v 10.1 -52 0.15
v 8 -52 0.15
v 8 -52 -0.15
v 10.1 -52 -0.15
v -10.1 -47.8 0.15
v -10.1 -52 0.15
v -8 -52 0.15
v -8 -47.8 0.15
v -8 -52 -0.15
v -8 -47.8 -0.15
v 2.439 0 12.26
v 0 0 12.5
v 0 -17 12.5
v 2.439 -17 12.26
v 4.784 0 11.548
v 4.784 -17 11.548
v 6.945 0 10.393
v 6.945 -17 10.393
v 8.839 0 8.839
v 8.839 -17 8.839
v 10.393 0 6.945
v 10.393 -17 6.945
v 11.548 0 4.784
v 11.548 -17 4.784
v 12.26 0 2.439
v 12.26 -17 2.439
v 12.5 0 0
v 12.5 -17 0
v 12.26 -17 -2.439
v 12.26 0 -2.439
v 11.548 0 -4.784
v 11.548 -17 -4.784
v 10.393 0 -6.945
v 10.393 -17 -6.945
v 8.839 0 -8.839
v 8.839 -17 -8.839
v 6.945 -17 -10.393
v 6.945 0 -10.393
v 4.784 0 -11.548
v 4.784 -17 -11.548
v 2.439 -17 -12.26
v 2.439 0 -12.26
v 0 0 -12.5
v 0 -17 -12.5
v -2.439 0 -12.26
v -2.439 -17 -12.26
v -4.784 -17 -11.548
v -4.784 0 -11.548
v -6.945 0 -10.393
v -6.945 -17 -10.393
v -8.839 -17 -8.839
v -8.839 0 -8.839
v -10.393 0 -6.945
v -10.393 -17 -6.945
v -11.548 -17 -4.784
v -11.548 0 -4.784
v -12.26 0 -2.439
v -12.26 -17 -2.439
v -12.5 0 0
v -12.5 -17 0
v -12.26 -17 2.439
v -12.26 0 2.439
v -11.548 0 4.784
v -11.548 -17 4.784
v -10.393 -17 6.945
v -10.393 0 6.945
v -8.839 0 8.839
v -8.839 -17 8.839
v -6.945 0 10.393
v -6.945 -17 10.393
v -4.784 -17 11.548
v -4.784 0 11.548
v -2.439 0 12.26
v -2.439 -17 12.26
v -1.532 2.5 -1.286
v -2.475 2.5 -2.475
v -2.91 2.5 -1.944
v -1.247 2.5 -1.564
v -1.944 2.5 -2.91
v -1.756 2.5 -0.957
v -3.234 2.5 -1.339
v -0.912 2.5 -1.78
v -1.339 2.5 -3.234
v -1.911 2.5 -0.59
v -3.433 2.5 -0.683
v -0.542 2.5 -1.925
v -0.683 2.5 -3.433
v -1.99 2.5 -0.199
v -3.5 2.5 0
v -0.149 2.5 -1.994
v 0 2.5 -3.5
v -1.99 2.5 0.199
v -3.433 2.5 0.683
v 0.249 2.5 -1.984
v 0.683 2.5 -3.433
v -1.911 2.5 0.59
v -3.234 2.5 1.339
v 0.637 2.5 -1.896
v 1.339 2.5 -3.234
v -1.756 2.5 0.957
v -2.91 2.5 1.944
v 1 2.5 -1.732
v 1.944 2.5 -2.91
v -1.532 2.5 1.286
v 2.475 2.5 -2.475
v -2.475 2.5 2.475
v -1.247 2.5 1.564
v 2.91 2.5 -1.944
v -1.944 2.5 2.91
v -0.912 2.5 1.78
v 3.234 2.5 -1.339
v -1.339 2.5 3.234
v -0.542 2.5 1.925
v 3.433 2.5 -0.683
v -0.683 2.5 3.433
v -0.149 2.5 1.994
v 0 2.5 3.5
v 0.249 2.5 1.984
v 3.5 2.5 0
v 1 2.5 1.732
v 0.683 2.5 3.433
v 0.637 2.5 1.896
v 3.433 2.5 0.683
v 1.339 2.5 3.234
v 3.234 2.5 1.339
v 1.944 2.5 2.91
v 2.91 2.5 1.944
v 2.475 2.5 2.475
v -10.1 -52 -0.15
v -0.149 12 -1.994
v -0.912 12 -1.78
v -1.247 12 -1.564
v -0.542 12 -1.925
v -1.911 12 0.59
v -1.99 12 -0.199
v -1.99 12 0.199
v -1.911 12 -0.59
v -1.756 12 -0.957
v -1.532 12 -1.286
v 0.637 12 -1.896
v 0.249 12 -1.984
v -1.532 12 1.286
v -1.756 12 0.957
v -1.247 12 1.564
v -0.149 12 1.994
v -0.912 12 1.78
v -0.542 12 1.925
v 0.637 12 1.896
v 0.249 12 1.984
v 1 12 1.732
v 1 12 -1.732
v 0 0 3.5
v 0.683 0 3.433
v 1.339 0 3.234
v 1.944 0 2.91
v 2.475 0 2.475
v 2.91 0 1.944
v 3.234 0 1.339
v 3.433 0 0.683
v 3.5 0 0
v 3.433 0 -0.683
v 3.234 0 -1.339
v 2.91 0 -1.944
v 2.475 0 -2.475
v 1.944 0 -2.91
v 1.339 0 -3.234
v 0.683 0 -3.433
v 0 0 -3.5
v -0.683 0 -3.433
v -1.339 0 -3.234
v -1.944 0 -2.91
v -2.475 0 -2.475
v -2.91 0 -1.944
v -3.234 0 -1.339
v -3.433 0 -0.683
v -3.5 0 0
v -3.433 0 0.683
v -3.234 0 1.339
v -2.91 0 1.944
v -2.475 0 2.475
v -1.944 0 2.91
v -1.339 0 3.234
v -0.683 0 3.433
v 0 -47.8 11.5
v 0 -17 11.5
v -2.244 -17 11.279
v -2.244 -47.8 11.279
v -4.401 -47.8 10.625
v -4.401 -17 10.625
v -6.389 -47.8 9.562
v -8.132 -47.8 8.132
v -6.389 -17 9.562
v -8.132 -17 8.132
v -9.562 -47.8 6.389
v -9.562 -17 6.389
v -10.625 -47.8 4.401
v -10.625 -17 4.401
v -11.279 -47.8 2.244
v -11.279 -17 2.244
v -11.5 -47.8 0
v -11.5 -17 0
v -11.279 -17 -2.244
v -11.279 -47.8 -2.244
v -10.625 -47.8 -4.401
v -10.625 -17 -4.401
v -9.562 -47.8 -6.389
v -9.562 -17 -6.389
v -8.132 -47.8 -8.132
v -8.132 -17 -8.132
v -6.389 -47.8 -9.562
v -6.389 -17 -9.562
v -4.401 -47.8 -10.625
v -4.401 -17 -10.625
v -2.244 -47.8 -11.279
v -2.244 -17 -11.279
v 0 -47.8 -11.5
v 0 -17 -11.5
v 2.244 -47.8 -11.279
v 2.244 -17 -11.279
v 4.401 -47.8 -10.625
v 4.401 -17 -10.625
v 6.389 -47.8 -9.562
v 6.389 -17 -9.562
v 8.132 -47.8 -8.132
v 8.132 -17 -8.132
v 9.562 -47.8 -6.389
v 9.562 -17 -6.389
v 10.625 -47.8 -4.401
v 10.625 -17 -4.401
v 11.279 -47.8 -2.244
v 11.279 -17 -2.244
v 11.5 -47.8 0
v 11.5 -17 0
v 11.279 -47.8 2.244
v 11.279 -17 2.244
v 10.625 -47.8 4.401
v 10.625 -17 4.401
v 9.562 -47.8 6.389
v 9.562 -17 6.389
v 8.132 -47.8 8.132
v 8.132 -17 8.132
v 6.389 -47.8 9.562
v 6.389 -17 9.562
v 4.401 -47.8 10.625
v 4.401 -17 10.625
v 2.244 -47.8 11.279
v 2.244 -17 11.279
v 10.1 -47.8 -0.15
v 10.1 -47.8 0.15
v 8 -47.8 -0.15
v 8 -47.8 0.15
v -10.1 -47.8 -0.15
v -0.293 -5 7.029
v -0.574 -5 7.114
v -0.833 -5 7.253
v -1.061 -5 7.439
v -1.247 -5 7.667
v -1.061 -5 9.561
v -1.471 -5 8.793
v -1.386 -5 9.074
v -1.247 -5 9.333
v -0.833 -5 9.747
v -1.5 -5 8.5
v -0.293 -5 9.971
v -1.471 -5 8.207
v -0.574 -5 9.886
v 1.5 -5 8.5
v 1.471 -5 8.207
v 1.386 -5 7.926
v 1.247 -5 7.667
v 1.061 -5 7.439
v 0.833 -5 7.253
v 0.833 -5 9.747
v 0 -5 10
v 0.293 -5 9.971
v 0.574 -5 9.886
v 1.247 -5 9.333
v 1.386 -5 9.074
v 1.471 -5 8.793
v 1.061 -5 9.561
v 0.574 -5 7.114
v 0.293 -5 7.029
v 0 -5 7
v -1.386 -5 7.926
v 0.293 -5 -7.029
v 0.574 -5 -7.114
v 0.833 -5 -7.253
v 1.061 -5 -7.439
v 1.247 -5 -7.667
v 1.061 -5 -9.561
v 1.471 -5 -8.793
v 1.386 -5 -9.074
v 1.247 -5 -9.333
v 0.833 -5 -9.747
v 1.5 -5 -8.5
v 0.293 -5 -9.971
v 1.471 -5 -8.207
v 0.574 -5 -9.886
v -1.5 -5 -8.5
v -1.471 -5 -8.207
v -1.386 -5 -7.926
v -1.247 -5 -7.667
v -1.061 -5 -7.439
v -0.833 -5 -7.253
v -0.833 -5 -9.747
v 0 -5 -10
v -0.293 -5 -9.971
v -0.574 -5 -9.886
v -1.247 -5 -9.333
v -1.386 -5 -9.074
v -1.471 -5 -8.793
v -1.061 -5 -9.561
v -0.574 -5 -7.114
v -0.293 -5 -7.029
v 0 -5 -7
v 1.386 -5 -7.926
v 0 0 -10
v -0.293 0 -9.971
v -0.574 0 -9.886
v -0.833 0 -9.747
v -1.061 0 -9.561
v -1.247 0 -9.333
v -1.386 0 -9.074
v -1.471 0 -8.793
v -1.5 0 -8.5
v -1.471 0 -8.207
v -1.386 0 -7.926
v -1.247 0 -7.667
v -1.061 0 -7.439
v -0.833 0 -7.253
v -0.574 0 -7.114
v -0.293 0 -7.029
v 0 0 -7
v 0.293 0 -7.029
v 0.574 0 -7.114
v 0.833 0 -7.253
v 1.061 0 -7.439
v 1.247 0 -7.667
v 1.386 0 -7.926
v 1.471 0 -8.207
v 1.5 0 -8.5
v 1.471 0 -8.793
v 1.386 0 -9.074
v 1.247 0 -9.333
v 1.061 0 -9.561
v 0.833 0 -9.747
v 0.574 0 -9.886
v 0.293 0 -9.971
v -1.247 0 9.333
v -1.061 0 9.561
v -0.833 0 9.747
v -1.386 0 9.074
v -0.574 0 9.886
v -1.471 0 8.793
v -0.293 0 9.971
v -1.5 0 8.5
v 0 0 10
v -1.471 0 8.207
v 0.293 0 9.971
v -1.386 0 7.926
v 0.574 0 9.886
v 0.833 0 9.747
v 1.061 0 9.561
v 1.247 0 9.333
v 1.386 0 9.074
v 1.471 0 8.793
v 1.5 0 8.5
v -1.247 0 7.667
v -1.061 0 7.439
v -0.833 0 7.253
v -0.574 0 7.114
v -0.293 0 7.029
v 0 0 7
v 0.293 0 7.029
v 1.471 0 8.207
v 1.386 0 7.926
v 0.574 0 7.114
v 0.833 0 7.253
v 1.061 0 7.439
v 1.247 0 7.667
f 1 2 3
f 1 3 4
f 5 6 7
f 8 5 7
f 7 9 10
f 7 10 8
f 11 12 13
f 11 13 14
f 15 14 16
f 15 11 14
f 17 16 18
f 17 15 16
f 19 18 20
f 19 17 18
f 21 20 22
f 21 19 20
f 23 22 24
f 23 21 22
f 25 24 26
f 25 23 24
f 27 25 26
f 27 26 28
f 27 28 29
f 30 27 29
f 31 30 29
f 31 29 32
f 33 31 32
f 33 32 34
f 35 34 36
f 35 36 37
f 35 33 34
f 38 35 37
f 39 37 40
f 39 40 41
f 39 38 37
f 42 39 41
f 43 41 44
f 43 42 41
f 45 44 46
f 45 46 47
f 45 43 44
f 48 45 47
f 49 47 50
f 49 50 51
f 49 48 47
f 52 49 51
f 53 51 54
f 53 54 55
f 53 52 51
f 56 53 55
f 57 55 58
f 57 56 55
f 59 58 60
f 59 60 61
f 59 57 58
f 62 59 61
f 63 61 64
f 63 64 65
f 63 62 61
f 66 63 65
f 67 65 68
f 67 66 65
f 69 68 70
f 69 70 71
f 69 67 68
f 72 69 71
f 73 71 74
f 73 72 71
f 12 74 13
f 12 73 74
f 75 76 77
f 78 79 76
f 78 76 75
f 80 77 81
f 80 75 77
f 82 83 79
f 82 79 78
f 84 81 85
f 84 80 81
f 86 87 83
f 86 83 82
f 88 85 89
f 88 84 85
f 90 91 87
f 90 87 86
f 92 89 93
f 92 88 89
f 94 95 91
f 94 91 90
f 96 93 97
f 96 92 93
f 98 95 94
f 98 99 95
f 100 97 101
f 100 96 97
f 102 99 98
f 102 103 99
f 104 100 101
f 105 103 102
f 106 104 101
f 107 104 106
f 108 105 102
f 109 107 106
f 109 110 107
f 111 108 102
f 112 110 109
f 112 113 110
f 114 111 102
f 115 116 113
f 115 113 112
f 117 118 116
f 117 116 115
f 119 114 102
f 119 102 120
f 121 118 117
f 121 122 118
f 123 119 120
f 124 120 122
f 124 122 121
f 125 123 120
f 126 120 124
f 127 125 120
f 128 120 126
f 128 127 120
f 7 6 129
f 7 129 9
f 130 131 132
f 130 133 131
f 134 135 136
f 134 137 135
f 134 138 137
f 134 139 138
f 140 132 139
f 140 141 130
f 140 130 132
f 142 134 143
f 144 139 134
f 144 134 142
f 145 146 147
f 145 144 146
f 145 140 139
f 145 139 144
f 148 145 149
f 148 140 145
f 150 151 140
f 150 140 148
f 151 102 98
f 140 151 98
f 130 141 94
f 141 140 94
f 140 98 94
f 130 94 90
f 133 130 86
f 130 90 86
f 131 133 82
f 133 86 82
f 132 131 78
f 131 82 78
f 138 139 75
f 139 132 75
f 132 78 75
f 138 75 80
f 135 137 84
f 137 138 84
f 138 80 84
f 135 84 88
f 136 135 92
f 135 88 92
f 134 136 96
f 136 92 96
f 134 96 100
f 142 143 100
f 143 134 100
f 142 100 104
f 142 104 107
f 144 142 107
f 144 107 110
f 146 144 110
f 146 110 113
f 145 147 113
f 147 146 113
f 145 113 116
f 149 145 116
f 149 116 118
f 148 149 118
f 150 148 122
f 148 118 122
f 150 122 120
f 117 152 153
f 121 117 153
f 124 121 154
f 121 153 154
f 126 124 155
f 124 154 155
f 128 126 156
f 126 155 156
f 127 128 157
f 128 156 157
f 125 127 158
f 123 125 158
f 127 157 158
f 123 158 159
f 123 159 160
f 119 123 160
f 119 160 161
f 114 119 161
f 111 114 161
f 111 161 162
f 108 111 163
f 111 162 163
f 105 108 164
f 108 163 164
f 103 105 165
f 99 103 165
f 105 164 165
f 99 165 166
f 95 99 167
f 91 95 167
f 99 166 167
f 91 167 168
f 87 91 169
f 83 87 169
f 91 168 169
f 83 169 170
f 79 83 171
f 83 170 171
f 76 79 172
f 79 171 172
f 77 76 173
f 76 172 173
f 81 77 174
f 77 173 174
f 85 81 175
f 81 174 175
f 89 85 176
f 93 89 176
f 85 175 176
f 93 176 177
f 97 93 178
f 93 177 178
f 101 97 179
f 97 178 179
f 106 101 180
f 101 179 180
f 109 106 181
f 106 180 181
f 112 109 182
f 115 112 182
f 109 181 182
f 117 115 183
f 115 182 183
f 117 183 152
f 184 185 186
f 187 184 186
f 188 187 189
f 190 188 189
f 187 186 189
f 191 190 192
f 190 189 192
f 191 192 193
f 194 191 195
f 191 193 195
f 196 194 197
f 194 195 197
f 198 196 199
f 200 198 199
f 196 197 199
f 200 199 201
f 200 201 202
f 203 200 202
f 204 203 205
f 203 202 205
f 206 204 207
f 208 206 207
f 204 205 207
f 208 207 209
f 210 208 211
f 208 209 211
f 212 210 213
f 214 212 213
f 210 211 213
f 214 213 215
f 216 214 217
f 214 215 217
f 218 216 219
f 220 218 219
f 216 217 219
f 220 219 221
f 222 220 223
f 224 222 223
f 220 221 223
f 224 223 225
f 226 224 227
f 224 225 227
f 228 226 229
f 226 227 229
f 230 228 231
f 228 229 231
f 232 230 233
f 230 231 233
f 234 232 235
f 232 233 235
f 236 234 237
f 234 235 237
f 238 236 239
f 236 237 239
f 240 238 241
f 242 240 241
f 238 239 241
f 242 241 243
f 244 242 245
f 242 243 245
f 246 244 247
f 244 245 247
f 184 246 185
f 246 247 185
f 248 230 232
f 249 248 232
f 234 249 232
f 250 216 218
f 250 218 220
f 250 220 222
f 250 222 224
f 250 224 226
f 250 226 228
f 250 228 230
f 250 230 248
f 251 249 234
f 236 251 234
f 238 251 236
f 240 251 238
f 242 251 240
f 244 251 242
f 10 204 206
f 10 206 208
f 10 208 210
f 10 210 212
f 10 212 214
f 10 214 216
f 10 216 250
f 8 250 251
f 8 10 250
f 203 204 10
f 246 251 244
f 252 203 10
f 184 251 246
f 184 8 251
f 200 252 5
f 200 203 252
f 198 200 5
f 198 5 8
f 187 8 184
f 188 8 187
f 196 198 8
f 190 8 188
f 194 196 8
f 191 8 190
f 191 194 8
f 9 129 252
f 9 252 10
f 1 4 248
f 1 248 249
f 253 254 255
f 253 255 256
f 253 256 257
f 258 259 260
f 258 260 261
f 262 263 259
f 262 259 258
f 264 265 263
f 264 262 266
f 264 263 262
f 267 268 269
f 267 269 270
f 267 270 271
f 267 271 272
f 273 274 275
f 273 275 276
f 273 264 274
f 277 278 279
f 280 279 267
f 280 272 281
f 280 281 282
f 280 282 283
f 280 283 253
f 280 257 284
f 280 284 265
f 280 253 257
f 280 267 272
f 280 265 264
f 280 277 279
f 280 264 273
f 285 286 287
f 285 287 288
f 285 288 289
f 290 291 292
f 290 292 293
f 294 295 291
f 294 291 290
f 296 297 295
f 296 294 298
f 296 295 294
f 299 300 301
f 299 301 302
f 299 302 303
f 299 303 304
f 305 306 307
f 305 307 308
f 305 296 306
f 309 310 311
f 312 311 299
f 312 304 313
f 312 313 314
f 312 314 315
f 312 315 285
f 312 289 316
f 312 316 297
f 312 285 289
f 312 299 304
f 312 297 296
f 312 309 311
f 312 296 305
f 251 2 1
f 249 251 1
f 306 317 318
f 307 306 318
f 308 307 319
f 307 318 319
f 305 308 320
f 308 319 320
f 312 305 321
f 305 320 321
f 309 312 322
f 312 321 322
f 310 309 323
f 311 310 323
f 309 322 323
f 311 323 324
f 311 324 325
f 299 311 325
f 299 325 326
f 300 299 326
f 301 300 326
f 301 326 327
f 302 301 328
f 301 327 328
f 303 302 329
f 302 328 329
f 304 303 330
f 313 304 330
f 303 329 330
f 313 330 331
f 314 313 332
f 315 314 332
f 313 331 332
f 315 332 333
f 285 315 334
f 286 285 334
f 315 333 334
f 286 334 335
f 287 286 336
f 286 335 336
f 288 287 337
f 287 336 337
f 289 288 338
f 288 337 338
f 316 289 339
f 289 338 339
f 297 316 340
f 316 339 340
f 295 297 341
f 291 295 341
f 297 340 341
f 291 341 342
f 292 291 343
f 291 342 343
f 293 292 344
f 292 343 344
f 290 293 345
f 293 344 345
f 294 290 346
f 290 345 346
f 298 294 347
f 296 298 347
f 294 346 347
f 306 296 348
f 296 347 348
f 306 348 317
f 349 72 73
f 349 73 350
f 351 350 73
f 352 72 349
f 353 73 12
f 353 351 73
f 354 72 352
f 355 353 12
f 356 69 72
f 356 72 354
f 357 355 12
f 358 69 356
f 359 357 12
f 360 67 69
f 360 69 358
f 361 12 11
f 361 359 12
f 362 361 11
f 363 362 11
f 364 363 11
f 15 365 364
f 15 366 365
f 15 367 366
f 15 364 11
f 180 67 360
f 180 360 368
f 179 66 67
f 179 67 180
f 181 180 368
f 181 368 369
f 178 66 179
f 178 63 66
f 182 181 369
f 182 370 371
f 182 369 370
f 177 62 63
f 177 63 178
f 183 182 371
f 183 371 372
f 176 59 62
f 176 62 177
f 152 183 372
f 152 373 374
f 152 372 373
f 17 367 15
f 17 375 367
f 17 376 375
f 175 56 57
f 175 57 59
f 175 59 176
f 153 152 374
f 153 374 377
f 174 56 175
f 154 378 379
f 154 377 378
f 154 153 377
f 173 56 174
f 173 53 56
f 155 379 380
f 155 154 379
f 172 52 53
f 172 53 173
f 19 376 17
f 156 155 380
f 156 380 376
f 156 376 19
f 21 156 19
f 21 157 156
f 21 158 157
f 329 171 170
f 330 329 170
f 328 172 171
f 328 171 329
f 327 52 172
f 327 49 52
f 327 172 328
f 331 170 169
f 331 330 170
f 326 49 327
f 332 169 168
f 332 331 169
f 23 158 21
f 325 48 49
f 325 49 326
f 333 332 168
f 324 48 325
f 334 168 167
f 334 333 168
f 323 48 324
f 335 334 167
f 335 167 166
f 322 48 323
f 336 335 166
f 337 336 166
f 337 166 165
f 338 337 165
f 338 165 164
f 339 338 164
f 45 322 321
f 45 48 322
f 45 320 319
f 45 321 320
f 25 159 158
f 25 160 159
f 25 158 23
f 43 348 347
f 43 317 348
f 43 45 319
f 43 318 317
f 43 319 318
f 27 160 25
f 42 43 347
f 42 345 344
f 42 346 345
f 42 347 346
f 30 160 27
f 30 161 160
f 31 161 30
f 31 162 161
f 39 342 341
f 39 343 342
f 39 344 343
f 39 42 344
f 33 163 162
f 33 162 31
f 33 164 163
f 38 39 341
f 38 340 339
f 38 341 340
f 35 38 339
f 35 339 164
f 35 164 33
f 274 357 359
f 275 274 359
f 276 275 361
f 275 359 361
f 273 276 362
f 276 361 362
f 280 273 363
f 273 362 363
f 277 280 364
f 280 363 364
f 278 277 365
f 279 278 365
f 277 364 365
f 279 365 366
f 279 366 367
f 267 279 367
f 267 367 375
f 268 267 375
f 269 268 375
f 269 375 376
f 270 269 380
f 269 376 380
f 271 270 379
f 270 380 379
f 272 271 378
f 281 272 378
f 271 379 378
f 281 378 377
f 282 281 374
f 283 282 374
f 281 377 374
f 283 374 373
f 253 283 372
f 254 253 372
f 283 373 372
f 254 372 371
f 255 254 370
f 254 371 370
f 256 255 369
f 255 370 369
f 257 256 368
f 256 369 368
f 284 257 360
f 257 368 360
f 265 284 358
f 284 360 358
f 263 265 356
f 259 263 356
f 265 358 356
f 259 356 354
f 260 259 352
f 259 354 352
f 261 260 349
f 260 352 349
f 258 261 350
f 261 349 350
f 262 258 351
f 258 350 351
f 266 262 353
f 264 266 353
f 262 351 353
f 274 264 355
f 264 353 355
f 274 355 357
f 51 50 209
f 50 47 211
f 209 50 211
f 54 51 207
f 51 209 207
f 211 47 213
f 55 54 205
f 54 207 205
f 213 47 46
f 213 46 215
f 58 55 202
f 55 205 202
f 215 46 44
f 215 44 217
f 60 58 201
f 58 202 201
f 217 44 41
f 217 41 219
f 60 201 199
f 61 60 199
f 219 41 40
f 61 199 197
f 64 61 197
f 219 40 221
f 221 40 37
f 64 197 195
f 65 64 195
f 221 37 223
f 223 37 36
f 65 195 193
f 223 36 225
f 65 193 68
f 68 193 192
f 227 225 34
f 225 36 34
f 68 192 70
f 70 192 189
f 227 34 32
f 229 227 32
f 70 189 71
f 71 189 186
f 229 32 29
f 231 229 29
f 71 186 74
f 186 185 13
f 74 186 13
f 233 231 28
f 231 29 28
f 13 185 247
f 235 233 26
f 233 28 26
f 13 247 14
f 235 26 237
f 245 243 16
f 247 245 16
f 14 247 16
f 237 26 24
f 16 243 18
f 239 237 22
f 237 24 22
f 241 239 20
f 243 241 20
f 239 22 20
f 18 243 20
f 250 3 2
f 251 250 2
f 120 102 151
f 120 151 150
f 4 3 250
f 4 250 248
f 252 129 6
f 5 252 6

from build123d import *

# Parameters (mm, degrees)
SKETCH2_R           = 12.5
SKETCH2_R_2         = 2
SKETCH2_R_3         = 3.5
BOSS_EXTRUDE1_DEPTH = 17
SKETCH2_3_R         = 2
BOSS_EXTRUDE2_DEPTH = 12
SKETCH2_4_R         = 3.5
SKETCH2_4_R_2       = 2
BOSS_EXTRUDE3_DEPTH = 2.5
SKETCH4_R           = 11.5
BOSS_EXTRUDE4_DEPTH = 30.8
SKETCH5_W           = 2.1
SKETCH5_H           = 0.3
BOSS_EXTRUDE5_DEPTH = 4.2
SKETCH6_R           = 1.5
CUT_EXTRUDE1_DEPTH  = 5
CUT_EXTRUDE2_START  = -9.5
CUT_EXTRUDE2_DEPTH  = 9.5


with BuildPart() as part:
    # Sketch2 → Boss-Extrude1 (new body)
    # profile 1 of 3: a face of its own
    with BuildSketch(Plane(origin=(0, 0, 0), x_dir=(1, 0, 0), z_dir=(0, 1, 0))):
        with Locations(Location((0, 0, 0), (0, 0, 270))):
            Circle(SKETCH2_R)
        Circle(SKETCH2_R_2, mode=Mode.SUBTRACT)
    # profile 2 of 3: a face of its own
    with BuildSketch(Plane(origin=(0, 0, 0), x_dir=(1, 0, 0), z_dir=(0, 1, 0))):
        Circle(SKETCH2_R_3)
        Circle(SKETCH2_R_2, mode=Mode.SUBTRACT)
    # profile 3 of 3: a face of its own
    with BuildSketch(Plane(origin=(0, 0, 0), x_dir=(1, 0, 0), z_dir=(0, 1, 0))):
        Circle(SKETCH2_R_2)
    extrude(amount=-BOSS_EXTRUDE1_DEPTH)

    # Sketch2<3> → Boss-Extrude2 (add)
    with BuildSketch(Plane(origin=(0, 0, 0), x_dir=(1, 0, 0), z_dir=(0, 1, 0))):
        with Locations(Location((0, 0, 0), (0, 0, 270))):
            Circle(SKETCH2_3_R)
    extrude(amount=BOSS_EXTRUDE2_DEPTH)

    # Sketch2<4> → Boss-Extrude3 (add)
    with BuildSketch(Plane(origin=(0, 0, 0), x_dir=(1, 0, 0), z_dir=(0, 1, 0))):
        with Locations(Location((0, 0, 0), (0, 0, 270))):
            Circle(SKETCH2_4_R)
        with Locations(Location((0, 0, 0), (0, 0, 270))):
            Circle(SKETCH2_4_R_2, mode=Mode.SUBTRACT)
    extrude(amount=BOSS_EXTRUDE3_DEPTH)

    # Sketch4 → Boss-Extrude4 (add)
    with BuildSketch(Plane.XZ.offset(17)):
        with Locations(Location((0, 0, 0), (0, 0, 90))):
            Circle(SKETCH4_R)
    extrude(amount=BOSS_EXTRUDE4_DEPTH)

    # Sketch5 → Boss-Extrude5 (add)
    with BuildSketch(Plane.XZ.offset(47.8)):
        with Locations((-9.05, 0)):
            Rectangle(SKETCH5_W, SKETCH5_H)
        with Locations((9.05, 0)):
            Rectangle(SKETCH5_W, SKETCH5_H)
    extrude(amount=BOSS_EXTRUDE5_DEPTH)

    # Sketch6 → Cut-Extrude1 (cut)
    with BuildSketch(Plane(origin=(0, 0, 0), x_dir=(1, 0, 0), z_dir=(0, 1, 0))):
        with Locations(Location((0, -8.5, 0), (0, 0, 270))):
            Circle(SKETCH6_R)
        with Locations(Location((0, 8.5, 0), (0, 0, 90))):
            Circle(SKETCH6_R)
    extrude(amount=-CUT_EXTRUDE1_DEPTH, mode=Mode.SUBTRACT)

    # Sketch7 → Cut-Extrude2 (cut)
    with BuildSketch(Plane(origin=(0, 12, 0), x_dir=(1, 0, 0), z_dir=(0, 1, 0)).offset(CUT_EXTRUDE2_START)):
        with BuildLine():
            ThreePointArc((1, -1.732050808), (2, 0), (1, 1.732050808))
            Line((1, 1.732050808), (1, -1.732050808))
        make_face()
    extrude(amount=CUT_EXTRUDE2_DEPTH, mode=Mode.SUBTRACT)


solid = part.part
